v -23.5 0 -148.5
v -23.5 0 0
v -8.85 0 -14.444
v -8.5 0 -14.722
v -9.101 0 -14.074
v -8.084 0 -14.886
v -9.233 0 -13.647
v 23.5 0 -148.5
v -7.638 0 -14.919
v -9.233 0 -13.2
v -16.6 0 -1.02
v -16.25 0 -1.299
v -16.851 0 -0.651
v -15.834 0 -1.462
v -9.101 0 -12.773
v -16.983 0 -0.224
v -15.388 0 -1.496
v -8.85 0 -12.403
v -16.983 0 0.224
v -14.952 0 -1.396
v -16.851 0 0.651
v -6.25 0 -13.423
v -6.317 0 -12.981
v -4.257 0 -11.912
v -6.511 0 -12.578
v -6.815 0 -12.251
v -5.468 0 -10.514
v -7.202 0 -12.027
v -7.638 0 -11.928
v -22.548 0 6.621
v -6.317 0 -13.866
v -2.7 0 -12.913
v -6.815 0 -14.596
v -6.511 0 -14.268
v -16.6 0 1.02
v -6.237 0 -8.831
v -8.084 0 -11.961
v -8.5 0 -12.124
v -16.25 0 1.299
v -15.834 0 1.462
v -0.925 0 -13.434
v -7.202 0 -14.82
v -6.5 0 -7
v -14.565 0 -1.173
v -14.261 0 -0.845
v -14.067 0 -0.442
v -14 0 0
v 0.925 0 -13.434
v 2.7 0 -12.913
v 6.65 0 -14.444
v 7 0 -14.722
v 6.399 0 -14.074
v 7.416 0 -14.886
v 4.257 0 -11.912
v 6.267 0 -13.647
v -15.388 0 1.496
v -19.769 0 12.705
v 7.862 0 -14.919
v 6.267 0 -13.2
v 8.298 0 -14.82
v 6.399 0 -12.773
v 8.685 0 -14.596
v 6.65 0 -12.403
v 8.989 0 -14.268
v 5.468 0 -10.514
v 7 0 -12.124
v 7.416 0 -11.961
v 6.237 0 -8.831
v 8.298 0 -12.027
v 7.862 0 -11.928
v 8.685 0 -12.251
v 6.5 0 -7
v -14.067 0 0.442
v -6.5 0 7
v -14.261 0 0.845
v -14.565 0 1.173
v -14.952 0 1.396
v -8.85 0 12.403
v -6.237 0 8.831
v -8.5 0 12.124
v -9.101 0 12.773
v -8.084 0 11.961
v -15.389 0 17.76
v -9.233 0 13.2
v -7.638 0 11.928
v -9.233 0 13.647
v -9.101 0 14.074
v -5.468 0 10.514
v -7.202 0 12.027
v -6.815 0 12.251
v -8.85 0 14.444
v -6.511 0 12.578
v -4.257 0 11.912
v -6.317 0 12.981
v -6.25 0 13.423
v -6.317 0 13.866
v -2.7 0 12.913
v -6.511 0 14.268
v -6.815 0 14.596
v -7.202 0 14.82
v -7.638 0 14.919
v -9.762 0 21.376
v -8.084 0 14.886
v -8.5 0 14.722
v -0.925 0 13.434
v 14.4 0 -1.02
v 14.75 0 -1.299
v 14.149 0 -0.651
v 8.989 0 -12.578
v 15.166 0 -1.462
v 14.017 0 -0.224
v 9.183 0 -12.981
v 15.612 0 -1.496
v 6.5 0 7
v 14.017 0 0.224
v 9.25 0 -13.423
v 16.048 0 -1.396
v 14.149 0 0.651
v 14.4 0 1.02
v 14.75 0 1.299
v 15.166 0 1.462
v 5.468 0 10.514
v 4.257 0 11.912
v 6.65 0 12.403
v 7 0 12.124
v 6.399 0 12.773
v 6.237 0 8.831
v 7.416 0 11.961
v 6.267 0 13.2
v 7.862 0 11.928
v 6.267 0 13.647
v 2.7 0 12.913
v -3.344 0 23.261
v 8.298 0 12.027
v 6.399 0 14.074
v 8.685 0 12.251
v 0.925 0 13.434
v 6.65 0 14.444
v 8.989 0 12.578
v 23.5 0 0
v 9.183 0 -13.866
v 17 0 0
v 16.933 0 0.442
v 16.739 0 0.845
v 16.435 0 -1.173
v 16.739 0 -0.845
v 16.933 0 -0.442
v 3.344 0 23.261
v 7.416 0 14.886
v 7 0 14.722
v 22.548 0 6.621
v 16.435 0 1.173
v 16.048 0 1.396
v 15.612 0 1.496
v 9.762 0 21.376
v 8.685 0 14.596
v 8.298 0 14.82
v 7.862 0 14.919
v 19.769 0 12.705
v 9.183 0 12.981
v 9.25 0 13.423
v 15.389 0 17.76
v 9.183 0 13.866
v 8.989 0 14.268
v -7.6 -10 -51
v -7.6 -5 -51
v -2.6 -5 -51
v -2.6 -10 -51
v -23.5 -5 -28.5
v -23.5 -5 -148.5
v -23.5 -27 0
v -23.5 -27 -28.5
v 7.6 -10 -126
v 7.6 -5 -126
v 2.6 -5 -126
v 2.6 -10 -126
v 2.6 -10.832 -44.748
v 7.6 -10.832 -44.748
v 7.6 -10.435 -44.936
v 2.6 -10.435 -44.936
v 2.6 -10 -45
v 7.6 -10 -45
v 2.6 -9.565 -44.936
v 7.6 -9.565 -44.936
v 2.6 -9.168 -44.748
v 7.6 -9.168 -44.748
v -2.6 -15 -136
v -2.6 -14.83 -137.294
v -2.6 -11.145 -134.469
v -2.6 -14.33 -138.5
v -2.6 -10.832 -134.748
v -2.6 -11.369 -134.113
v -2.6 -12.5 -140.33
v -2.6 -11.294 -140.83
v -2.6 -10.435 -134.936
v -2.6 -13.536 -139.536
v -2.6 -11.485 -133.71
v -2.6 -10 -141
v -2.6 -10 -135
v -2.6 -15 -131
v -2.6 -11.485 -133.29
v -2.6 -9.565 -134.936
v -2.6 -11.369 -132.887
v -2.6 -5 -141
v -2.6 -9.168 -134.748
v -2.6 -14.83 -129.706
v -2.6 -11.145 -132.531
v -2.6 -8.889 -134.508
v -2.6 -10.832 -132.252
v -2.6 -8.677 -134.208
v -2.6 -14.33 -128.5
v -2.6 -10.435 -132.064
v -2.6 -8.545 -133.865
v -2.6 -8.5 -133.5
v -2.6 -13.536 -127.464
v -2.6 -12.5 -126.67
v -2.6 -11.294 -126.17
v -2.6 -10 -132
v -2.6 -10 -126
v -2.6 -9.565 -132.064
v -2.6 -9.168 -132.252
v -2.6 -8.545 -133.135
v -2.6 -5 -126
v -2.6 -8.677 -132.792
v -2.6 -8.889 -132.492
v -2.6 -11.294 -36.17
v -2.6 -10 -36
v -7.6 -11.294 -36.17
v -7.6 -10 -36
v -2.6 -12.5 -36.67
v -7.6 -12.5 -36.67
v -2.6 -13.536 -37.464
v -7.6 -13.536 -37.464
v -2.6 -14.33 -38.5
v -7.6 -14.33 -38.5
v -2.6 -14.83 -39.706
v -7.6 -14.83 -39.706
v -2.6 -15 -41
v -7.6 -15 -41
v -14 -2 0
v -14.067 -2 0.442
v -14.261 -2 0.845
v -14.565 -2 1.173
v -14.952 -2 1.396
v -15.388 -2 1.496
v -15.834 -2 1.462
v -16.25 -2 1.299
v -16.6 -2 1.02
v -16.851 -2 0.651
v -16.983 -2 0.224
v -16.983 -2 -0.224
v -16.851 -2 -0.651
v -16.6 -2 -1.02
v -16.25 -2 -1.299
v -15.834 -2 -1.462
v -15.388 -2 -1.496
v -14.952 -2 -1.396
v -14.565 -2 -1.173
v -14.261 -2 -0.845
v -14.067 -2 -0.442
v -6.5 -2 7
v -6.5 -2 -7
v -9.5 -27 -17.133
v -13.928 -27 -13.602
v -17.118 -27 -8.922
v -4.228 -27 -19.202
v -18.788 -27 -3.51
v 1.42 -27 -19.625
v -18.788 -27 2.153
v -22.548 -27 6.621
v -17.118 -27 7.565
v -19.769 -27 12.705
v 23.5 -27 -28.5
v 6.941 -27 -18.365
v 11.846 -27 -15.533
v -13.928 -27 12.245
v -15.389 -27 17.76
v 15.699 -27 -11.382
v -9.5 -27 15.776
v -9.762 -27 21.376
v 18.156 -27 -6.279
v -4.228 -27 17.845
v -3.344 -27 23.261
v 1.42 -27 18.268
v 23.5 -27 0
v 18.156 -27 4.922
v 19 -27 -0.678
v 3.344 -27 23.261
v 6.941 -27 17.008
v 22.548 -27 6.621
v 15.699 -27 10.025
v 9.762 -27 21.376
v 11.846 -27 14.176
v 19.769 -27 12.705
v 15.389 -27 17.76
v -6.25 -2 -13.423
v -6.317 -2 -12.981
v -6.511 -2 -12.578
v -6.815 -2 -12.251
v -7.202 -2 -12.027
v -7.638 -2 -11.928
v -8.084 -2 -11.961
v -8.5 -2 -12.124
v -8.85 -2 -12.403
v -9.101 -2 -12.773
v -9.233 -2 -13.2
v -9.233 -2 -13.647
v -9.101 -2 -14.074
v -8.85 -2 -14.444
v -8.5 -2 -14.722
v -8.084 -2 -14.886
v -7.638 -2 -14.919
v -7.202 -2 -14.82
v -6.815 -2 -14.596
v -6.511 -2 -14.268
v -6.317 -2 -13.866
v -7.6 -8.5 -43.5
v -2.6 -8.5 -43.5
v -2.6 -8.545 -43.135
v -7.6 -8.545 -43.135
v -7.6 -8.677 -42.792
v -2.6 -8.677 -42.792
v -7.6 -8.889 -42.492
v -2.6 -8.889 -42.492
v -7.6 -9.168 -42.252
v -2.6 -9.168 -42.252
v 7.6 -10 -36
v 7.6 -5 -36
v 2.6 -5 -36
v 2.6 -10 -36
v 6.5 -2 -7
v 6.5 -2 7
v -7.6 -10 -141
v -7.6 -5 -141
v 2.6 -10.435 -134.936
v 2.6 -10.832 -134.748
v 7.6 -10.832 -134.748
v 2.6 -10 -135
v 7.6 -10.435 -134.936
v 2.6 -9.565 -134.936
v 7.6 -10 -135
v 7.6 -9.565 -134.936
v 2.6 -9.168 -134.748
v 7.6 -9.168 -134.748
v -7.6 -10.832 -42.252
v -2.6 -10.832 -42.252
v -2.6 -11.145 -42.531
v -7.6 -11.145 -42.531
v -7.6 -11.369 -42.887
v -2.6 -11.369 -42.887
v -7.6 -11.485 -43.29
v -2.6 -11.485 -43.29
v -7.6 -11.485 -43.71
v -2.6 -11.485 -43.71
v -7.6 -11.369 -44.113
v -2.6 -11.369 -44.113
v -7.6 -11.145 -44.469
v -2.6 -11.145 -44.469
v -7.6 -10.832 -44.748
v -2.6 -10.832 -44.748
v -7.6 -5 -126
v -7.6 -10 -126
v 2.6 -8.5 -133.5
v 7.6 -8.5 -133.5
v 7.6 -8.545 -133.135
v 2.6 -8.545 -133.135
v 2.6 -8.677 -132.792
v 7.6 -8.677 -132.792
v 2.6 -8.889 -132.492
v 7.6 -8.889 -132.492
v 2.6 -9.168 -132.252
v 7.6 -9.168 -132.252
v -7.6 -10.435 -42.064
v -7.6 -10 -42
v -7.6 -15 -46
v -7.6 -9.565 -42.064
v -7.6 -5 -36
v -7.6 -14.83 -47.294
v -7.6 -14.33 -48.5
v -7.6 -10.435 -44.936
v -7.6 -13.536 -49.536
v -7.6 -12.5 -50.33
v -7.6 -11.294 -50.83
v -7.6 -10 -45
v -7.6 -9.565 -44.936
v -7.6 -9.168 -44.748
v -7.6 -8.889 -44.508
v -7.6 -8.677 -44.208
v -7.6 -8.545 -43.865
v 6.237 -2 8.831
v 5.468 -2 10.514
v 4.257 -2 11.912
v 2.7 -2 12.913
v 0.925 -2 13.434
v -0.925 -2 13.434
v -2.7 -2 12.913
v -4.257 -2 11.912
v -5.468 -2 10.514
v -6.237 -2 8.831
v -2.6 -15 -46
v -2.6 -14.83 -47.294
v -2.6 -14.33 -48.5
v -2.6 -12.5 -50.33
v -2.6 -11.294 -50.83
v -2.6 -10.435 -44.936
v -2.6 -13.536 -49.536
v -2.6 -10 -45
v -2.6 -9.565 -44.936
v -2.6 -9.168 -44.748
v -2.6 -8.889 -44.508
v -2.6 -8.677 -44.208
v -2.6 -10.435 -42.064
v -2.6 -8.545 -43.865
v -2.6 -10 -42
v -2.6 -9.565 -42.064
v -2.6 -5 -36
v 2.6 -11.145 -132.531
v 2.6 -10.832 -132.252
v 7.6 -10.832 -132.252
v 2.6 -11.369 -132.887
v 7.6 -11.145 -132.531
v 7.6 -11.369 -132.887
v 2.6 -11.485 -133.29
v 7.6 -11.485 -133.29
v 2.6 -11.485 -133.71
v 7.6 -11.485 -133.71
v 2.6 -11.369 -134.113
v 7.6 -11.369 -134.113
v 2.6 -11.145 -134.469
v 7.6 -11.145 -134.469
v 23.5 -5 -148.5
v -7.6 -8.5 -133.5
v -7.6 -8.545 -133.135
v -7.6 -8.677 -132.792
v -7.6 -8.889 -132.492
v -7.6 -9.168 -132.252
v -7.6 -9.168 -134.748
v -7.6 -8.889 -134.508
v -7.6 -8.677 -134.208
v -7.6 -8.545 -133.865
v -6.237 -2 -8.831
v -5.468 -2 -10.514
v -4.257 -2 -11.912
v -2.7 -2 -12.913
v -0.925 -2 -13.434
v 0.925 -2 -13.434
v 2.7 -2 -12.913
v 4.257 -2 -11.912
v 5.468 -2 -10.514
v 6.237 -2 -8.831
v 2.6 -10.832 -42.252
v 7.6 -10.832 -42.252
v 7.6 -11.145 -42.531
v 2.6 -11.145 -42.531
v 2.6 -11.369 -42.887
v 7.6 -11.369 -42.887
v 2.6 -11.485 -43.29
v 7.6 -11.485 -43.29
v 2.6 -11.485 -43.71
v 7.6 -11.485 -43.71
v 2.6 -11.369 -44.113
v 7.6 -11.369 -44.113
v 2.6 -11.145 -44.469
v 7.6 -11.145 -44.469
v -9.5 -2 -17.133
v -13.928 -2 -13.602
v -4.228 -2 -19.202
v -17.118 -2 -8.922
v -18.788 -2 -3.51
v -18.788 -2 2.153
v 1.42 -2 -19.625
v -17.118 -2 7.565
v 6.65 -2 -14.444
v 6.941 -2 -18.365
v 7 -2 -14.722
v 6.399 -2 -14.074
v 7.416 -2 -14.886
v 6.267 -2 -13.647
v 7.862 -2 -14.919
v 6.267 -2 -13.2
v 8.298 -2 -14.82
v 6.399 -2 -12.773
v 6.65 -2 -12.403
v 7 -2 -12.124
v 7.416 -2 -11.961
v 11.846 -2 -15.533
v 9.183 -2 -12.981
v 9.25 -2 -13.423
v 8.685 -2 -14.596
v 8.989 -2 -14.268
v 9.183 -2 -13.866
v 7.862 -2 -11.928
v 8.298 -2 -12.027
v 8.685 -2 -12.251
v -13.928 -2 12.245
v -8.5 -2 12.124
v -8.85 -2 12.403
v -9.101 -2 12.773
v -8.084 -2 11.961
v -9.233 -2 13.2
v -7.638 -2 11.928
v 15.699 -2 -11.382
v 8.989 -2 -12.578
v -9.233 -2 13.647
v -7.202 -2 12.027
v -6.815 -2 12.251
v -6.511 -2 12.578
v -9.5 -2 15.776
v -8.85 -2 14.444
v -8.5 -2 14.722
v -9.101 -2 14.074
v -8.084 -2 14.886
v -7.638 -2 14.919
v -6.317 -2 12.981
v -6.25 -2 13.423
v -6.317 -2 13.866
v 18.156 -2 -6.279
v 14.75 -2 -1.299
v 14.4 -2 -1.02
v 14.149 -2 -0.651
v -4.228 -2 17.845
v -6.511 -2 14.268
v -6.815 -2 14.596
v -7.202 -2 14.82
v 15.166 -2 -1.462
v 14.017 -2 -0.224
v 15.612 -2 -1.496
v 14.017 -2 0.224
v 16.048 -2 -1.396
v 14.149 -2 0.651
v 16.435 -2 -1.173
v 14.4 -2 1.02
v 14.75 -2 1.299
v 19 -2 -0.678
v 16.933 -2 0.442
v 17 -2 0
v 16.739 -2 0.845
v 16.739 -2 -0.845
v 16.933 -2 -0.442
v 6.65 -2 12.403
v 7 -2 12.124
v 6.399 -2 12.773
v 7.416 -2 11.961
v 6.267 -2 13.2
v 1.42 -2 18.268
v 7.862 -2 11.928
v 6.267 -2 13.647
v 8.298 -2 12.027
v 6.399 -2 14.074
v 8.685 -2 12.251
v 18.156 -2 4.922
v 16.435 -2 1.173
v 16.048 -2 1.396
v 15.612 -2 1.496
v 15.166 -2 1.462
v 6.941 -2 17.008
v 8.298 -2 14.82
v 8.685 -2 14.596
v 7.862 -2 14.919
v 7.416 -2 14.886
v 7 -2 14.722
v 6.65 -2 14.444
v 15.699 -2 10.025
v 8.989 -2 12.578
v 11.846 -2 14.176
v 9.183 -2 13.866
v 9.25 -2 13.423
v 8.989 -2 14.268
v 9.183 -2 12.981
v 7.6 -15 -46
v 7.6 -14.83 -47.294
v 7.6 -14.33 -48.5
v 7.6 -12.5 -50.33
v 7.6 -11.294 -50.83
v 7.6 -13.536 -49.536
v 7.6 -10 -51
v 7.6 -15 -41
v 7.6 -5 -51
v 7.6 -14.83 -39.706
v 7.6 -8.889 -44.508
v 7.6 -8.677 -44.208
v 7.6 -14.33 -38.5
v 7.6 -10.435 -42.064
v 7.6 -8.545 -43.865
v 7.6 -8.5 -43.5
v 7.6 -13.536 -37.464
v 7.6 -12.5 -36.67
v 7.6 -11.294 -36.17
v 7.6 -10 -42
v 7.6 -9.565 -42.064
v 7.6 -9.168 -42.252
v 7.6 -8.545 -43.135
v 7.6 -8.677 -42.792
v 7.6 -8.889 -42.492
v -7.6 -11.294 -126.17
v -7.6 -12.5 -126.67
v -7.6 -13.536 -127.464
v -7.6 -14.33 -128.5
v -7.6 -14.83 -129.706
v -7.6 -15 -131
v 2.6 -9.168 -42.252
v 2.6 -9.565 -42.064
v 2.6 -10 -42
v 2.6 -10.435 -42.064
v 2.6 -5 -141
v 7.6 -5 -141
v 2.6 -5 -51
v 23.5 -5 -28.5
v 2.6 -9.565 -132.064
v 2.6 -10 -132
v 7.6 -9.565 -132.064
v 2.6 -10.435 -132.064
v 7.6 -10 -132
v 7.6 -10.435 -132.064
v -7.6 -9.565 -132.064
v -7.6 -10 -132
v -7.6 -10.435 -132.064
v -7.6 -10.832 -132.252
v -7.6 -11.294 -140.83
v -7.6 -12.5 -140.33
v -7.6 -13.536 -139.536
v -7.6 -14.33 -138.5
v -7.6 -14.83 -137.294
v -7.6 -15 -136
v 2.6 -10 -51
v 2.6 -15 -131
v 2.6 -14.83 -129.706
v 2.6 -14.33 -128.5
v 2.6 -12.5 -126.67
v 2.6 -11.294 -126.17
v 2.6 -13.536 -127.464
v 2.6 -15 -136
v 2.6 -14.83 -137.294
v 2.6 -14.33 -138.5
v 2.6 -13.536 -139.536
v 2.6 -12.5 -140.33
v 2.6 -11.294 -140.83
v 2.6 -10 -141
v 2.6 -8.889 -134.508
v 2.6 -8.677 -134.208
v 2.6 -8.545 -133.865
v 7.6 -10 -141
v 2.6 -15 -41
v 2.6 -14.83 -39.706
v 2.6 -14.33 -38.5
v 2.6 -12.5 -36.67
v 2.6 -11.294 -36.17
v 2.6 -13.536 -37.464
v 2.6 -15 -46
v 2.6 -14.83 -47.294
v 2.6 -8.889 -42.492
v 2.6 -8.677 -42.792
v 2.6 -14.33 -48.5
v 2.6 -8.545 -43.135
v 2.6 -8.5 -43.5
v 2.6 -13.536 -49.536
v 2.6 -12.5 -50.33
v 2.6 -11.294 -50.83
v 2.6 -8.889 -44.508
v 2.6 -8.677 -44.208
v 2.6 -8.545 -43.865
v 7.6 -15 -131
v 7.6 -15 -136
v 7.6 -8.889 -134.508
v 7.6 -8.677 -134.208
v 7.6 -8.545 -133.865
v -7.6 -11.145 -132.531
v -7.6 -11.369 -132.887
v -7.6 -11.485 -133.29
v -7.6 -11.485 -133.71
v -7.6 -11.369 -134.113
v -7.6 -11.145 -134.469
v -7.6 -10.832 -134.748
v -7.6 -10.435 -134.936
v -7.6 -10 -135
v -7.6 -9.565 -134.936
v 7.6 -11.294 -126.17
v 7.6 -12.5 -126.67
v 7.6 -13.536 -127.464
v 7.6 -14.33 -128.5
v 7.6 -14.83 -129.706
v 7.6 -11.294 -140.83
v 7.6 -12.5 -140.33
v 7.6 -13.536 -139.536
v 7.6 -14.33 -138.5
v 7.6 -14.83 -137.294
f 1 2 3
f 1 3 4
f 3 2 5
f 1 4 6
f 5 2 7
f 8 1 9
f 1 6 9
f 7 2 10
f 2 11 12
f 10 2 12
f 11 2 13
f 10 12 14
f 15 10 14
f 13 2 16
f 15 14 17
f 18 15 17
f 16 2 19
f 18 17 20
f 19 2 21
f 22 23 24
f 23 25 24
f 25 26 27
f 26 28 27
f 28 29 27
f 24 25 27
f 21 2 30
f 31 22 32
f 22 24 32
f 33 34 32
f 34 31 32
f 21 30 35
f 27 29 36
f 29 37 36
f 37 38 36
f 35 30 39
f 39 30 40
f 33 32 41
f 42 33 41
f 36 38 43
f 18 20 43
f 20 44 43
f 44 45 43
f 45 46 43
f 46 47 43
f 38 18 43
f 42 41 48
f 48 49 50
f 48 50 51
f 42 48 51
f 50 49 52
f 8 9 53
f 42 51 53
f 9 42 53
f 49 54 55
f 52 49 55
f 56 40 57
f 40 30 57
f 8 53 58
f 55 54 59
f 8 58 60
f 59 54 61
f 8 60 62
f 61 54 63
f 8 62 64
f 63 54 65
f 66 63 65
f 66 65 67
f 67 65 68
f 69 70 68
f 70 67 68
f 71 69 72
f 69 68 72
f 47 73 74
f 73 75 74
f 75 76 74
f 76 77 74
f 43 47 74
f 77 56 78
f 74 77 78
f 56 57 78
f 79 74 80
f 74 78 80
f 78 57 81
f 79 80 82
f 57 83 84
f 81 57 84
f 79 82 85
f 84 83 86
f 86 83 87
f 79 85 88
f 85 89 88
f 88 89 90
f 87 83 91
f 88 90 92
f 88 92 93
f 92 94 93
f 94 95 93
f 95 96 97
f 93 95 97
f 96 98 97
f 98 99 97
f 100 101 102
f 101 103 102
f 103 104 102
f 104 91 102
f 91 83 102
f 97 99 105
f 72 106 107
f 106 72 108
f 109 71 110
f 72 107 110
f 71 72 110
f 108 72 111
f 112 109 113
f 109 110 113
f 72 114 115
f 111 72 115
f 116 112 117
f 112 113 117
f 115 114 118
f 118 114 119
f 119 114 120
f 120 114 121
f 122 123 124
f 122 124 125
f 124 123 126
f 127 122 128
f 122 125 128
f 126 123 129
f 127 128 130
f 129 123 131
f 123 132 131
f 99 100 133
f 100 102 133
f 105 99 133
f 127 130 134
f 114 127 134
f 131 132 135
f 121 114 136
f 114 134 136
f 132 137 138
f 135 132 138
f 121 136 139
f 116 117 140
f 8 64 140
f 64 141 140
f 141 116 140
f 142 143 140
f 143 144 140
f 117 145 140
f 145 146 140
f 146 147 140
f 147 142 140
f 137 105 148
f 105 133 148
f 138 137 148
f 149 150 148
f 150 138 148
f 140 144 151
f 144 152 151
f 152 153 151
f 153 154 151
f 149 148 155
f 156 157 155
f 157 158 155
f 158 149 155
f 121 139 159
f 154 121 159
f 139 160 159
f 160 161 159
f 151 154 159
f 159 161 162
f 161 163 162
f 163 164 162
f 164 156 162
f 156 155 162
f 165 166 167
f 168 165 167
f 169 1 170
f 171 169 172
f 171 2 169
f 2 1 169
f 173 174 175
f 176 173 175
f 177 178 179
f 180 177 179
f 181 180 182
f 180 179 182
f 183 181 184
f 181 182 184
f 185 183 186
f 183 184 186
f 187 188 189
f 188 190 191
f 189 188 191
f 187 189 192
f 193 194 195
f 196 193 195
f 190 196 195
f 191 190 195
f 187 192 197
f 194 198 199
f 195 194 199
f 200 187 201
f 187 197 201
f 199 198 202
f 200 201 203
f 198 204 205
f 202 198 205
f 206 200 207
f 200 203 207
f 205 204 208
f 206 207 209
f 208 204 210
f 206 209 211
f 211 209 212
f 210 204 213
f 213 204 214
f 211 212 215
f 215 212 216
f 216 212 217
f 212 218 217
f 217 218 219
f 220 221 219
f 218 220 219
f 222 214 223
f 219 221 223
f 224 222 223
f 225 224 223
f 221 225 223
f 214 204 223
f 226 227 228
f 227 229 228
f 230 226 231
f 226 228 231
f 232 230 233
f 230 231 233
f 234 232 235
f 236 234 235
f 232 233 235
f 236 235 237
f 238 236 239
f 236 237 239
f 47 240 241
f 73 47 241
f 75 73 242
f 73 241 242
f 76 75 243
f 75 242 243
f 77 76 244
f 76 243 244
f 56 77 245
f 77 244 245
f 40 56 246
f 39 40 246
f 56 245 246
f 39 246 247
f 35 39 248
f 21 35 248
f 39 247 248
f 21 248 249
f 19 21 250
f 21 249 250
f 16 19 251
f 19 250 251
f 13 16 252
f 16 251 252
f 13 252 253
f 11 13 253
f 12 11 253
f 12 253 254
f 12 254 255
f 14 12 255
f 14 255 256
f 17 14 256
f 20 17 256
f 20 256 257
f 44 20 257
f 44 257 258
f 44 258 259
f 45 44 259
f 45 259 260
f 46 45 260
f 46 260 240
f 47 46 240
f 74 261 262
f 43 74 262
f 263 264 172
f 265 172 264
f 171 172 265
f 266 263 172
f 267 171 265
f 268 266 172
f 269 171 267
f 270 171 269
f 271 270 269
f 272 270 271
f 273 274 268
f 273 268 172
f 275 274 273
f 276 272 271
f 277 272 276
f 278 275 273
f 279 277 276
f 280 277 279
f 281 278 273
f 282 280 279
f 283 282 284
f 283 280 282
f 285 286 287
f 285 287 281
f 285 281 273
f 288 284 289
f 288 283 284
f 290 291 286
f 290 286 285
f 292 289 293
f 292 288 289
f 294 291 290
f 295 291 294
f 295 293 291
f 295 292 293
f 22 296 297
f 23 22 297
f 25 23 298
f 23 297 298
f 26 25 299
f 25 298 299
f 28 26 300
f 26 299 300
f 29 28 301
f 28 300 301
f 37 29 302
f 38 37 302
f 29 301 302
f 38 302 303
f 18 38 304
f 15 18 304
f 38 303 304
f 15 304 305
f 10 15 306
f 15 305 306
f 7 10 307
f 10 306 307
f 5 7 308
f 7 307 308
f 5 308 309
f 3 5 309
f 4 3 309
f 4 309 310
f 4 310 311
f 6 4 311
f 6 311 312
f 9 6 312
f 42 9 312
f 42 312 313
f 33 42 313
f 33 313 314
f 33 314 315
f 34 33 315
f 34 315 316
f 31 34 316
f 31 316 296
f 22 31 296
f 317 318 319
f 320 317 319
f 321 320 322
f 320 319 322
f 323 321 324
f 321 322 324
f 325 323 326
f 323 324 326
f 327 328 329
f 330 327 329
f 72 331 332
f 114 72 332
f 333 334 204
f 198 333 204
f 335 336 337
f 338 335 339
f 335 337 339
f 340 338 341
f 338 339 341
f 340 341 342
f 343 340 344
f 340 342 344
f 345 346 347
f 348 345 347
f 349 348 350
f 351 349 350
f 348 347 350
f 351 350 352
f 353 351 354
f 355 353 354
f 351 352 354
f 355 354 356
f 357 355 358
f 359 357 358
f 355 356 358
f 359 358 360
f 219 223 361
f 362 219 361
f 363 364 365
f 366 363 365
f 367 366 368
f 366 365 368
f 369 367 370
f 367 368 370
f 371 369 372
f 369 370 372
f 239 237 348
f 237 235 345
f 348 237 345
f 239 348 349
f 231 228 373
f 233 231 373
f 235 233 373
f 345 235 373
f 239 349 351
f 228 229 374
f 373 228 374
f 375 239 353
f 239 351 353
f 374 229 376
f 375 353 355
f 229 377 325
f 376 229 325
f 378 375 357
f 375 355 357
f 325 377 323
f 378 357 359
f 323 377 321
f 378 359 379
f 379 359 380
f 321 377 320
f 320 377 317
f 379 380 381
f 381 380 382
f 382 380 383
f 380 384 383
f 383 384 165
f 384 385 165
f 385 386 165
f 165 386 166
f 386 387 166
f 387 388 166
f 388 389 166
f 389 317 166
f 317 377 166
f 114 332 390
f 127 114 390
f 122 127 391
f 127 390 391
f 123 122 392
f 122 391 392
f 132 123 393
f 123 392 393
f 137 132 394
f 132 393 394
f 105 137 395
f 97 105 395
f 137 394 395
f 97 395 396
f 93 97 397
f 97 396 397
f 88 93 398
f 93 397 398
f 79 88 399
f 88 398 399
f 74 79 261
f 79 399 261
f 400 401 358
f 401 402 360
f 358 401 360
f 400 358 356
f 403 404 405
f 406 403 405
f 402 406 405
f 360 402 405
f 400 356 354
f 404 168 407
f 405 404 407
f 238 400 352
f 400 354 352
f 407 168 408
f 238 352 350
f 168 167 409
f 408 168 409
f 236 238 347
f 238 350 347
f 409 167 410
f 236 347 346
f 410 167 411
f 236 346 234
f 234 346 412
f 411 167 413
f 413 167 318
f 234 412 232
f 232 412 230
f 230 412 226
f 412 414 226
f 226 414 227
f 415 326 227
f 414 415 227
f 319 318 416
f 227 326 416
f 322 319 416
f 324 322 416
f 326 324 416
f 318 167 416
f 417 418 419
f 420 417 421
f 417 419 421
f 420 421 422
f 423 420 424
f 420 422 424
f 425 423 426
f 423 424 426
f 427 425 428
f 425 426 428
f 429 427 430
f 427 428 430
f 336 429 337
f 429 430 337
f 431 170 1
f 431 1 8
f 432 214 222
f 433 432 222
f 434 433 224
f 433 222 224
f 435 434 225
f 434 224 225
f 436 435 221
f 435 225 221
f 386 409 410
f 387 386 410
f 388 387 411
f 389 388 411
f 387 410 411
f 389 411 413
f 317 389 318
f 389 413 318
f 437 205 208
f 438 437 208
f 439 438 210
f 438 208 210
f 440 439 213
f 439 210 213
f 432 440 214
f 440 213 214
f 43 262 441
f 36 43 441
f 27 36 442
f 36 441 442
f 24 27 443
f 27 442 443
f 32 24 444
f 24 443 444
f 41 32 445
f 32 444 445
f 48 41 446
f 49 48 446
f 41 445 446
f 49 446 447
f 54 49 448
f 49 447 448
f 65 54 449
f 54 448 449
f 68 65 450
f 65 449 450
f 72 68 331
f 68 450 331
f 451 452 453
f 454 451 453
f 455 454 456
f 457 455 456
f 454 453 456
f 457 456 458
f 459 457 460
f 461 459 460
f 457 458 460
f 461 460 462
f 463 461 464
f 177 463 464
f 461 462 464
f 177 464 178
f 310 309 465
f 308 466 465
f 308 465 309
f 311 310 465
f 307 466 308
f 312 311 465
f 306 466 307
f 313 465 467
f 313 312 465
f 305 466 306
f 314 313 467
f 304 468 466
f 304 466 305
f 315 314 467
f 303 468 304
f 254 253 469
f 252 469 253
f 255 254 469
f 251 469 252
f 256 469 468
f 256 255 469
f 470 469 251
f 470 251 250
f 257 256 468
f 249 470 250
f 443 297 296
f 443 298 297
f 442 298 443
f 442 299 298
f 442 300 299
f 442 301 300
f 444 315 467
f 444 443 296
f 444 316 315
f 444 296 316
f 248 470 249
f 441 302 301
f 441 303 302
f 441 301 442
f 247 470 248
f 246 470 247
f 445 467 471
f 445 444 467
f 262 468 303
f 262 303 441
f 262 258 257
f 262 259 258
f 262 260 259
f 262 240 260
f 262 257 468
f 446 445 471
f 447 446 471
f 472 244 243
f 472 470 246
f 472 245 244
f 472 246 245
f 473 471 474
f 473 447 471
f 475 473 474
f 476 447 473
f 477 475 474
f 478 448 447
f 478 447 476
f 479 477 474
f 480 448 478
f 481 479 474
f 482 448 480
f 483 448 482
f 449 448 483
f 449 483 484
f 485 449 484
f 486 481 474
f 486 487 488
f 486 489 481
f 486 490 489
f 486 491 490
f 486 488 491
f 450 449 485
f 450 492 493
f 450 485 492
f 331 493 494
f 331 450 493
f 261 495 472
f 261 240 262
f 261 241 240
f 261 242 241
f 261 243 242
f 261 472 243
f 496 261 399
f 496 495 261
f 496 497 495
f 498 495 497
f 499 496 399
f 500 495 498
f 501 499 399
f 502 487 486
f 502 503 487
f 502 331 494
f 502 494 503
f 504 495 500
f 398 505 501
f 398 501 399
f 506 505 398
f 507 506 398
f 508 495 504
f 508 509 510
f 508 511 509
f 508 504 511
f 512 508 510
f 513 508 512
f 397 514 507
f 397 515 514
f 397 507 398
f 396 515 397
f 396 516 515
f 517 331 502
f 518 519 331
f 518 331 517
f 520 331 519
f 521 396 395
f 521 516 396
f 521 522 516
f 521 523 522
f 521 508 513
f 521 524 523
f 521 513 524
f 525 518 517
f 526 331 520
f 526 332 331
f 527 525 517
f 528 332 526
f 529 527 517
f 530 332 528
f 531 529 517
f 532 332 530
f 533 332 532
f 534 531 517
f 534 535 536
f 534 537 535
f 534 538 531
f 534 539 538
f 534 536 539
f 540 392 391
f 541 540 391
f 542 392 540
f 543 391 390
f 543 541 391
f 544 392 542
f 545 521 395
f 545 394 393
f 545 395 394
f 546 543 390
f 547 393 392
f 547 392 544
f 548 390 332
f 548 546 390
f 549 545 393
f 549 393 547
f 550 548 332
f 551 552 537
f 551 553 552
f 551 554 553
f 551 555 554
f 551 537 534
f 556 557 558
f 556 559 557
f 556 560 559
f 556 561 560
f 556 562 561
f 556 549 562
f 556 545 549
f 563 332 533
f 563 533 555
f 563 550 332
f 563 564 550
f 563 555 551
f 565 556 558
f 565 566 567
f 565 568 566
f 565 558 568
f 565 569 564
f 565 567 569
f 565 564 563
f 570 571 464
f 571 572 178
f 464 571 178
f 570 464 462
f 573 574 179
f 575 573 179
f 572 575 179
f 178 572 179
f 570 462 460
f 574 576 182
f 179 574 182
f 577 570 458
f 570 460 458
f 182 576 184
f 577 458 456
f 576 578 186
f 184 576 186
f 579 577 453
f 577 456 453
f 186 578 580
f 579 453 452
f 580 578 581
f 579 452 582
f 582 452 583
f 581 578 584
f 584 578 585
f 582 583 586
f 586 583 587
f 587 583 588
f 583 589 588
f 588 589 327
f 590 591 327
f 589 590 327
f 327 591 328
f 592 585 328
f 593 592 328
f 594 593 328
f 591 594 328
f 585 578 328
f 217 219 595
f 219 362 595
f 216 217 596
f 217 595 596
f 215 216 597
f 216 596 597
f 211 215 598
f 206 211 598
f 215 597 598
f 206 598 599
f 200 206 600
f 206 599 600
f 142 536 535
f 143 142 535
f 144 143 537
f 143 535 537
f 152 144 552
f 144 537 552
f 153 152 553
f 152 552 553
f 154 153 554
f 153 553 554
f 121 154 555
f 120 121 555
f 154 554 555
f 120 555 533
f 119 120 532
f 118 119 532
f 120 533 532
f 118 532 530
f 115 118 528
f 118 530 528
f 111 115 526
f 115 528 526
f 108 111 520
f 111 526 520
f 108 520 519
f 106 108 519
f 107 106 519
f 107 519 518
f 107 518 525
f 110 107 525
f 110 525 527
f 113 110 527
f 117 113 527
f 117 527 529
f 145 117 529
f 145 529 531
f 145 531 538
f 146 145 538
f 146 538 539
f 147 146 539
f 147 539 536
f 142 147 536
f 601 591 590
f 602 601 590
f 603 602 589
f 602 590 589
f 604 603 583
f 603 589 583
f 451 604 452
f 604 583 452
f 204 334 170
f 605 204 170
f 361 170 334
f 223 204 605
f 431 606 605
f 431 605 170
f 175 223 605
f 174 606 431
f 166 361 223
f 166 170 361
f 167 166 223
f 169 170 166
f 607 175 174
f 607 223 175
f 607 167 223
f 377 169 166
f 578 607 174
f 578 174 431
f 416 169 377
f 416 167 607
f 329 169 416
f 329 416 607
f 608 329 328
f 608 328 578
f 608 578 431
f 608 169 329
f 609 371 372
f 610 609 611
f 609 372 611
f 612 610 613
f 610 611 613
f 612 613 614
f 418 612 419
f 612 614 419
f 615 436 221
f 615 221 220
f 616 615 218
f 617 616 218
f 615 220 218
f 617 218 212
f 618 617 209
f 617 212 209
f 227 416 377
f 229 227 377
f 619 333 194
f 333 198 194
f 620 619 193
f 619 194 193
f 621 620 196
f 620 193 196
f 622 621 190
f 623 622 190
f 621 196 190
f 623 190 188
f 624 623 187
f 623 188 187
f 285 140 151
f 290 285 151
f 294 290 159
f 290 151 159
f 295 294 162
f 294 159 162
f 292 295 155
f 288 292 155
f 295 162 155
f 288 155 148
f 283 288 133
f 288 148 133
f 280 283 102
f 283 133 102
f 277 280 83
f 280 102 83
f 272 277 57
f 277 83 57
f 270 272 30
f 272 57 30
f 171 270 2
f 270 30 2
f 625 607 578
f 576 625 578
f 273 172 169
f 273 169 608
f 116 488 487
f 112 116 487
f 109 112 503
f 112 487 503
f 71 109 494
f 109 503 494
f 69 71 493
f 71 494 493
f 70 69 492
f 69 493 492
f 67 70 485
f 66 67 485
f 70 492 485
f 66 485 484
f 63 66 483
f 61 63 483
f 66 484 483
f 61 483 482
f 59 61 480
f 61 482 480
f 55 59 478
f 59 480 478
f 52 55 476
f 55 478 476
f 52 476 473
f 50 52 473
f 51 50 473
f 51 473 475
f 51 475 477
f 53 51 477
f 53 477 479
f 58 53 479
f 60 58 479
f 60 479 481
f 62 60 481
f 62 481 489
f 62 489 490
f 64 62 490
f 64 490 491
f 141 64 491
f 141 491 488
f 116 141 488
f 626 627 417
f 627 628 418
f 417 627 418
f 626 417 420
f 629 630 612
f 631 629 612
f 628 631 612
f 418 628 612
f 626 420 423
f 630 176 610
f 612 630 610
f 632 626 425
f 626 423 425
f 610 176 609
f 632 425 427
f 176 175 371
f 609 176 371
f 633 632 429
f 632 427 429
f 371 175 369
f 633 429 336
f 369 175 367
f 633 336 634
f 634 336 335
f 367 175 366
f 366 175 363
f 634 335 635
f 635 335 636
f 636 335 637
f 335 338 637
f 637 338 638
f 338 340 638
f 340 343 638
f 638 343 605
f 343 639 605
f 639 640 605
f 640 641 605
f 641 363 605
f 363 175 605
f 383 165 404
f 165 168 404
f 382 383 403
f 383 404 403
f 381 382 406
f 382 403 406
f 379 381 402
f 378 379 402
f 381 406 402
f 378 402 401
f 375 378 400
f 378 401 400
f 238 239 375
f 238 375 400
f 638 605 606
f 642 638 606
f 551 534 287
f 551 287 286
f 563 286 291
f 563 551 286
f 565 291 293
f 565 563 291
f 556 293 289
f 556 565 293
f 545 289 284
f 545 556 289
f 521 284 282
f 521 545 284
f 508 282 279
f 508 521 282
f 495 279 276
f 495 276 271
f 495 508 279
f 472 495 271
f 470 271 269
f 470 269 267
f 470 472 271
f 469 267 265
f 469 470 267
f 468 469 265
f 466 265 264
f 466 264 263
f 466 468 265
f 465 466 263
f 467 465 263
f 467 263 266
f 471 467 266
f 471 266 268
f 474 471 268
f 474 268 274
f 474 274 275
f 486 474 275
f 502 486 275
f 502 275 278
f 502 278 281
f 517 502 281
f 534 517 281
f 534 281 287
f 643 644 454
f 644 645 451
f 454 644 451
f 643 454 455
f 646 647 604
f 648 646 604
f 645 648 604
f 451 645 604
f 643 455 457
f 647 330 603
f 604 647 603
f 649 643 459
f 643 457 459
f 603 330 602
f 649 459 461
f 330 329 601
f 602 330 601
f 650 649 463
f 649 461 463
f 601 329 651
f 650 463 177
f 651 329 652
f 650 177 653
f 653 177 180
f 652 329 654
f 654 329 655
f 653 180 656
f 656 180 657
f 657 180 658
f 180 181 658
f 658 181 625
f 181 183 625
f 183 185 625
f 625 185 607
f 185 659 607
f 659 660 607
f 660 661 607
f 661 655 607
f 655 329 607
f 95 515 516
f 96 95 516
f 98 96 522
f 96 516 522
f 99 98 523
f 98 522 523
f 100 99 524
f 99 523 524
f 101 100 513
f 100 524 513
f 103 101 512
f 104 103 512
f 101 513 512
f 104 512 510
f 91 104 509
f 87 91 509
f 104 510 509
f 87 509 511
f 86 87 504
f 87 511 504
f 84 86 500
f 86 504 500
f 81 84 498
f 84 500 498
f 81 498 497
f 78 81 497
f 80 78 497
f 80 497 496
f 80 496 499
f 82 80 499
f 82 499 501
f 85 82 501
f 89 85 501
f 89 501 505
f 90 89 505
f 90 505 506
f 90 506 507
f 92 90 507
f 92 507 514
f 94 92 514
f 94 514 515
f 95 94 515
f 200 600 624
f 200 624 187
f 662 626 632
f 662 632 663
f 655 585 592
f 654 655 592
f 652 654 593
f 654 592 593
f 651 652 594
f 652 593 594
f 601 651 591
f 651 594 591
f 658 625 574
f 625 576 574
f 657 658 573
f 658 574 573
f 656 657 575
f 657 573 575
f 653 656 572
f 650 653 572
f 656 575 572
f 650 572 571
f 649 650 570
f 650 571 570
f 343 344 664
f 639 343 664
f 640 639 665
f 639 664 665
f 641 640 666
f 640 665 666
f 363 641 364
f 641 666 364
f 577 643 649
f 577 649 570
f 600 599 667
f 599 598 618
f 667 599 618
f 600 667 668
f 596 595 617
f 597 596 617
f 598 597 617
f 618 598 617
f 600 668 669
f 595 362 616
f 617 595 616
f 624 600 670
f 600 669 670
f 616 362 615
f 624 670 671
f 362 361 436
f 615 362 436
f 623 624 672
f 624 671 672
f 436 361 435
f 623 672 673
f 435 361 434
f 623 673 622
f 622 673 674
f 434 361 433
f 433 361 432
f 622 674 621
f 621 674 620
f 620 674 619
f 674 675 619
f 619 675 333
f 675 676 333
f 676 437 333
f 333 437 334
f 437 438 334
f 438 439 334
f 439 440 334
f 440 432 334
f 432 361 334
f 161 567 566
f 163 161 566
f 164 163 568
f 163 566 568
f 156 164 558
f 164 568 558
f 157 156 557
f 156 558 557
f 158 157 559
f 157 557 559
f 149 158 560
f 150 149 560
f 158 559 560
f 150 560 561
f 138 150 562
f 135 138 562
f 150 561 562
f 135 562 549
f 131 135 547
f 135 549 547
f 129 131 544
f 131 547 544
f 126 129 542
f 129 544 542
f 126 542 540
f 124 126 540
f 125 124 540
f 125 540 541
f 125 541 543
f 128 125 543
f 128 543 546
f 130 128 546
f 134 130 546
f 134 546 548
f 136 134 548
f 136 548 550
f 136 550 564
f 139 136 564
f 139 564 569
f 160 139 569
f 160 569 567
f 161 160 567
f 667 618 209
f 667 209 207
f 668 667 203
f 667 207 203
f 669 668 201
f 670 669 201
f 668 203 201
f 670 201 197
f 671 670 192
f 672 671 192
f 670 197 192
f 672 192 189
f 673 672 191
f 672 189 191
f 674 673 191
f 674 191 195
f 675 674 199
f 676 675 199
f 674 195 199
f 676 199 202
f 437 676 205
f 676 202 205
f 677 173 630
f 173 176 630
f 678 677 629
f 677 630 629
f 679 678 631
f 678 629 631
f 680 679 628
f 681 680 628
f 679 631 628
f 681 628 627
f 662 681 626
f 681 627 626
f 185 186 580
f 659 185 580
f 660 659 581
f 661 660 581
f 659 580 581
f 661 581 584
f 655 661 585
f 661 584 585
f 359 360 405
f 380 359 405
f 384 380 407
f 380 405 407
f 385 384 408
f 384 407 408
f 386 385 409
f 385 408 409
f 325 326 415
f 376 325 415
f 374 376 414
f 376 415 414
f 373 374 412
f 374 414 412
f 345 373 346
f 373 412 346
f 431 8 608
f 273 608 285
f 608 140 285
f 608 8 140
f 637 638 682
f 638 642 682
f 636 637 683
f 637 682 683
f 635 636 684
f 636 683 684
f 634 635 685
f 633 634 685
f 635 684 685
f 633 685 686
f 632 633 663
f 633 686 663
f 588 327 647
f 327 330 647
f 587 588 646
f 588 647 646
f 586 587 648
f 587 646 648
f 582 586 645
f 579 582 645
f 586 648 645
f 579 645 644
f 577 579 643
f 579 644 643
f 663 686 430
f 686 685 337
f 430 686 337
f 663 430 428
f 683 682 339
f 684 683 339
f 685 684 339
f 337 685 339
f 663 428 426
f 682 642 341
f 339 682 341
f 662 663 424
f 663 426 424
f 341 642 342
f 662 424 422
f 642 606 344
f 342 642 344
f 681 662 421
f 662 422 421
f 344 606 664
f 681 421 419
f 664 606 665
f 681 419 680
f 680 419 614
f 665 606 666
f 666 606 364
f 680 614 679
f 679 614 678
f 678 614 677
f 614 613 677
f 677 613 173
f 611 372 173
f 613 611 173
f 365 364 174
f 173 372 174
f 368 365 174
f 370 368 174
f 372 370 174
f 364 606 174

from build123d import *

# Parameters (mm, degrees)
F1_DEPTH  = 2
F2_R      = 1.5
F3_DEPTH  = 5
F4_R      = 19
F5_DEPTH  = 27
F6_W      = 47
F6_H      = 27
F7_DEPTH  = 5
F8_W      = 47
F8_H      = 5
F9_DEPTH  = 120
F11_DEPTH = 10
F13_DEPTH = 25
F15_DEPTH = 25
F16_R     = 5


with BuildPart() as f1:
    # F0 (on Front) → F1 (new body)
    with BuildSketch(Plane.XZ):
        with BuildLine():
            Line((-23.5, -23.5), (0, -23.5))
            Line((0, -23.5), (23.5, -23.5))
            Line((23.5, -23.5), (23.5, 0))
            ThreePointArc((23.5, 0), (0, 23.5), (-23.5, 0))
            Line((-23.5, 0), (-23.5, -23.5))
        make_face()
    extrude(amount=F1_DEPTH)

    # F2 (on face) → F3 (cut)
    with BuildSketch(Plane.XZ.offset(2)):
        with Locations((15.5, 0)):
            Circle(F2_R)
        with Locations((7.75, 13.423394)):
            Circle(F2_R)
        with Locations((-7.75, 13.423394)):
            Circle(F2_R)
        with Locations((-15.5, 0)):
            Circle(F2_R)
        with Locations((-7.75, -13.423394)):
            Circle(F2_R)
        with Locations((7.75, -13.423394)):
            Circle(F2_R)
        with BuildLine():
            Line((6.5, -7), (6.5, 7))
            ThreePointArc((6.5, 7), (0, 13.5), (-6.5, 7))
            Line((-6.5, 7), (-6.5, -7))
            ThreePointArc((-6.5, -7), (0, -13.5), (6.5, -7))
        make_face()
    extrude(amount=-F3_DEPTH, mode=Mode.SUBTRACT)

    # F4 (on Front) → F5 (join)
    with BuildSketch(Plane.XZ):
        with BuildLine():
            ThreePointArc((23.5, 0), (0, 23.5), (-23.5, 0))
            Line((-23.5, 0), (-23.5, -23.5))
            Line((-23.5, -23.5), (23.5, -23.5))
            Line((23.5, -23.5), (23.5, 0))
        make_face()
        with Locations((0, -0.678439)):
            Circle(F4_R, mode=Mode.SUBTRACT)
    extrude(amount=F5_DEPTH)

    # F6 (on face) → F7 (join)
    with BuildSketch(Plane(origin=(0, 0, -23.5), x_dir=(1, 0, 0), z_dir=(0, 0, -1))):
        with Locations((0, 13.5)):
            Rectangle(F6_W, F6_H)
    extrude(amount=F7_DEPTH)

    # F8 (on face) → F9 (join)
    with BuildSketch(Plane(origin=(0, 0, -28.5), x_dir=(1, 0, 0), z_dir=(0, 0, -1))):
        with Locations((0, 2.5)):
            Rectangle(F8_W, F8_H)
    extrude(amount=F9_DEPTH)

    # F10 (on face) → F11 (join)
    with BuildSketch(Plane.XZ.offset(5)):
        Polygon((-2.6, -51), (-2.6, -43.5), (-2.6, -36), (-7.6, -36), (-7.6, -51), align=None)
        Polygon((2.6, -126), (2.6, -133.5), (2.6, -141), (7.6, -141), (7.6, -126), align=None)
        Polygon((2.6, -36), (2.6, -43.5), (2.6, -51), (7.6, -51), (7.6, -36), align=None)
        Polygon((-2.6, -141), (-2.6, -133.5), (-2.6, -126), (-7.6, -126), (-7.6, -141), align=None)
    extrude(amount=F11_DEPTH)

    # F12 (on face) → F13 (cut)
    with BuildSketch(Plane.YZ.offset(7.6)):
        with BuildLine():
            ThreePointArc((-9.16795, -42.251925), (-10, -42), (-10.83205, -42.251925))
            Line((-10.83205, -42.251925), (-10, -43.5))
            Line((-10, -43.5), (-9.16795, -42.251925))
        make_face()
        with BuildLine():
            Line((-10, -43.5), (-10.83205, -42.251925))
            ThreePointArc((-10.83205, -42.251925), (-11.5, -43.5), (-10.83205, -44.748075))
            Line((-10.83205, -44.748075), (-10, -43.5))
        make_face()
        with BuildLine():
            Line((-9.16795, -42.251925), (-10, -43.5))
            Line((-10, -43.5), (-9.16795, -44.748075))
            ThreePointArc((-9.16795, -44.748075), (-8.677488, -44.207787), (-8.5, -43.5))
            ThreePointArc((-8.5, -43.5), (-8.677488, -42.792213), (-9.16795, -42.251925))
        make_face()
        with BuildLine():
            Line((-9.16795, -44.748075), (-10, -43.5))
            Line((-10, -43.5), (-10.83205, -44.748075))
            ThreePointArc((-10.83205, -44.748075), (-10, -45), (-9.16795, -44.748075))
        make_face()
    extrude(amount=-F13_DEPTH, mode=Mode.SUBTRACT)

    # F14 (on face) → F15 (cut)
    with BuildSketch(Plane.YZ.offset(7.6)):
        with BuildLine():
            ThreePointArc((-9.16795, -132.251925), (-10, -132), (-10.83205, -132.251925))
            Line((-10.83205, -132.251925), (-10, -133.5))
            Line((-10, -133.5), (-9.16795, -132.251925))
        make_face()
        with BuildLine():
            Line((-10, -133.5), (-10.83205, -132.251925))
            ThreePointArc((-10.83205, -132.251925), (-11.5, -133.5), (-10.83205, -134.748075))
            Line((-10.83205, -134.748075), (-10, -133.5))
        make_face()
        with BuildLine():
            Line((-9.16795, -132.251925), (-10, -133.5))
            Line((-10, -133.5), (-9.16795, -134.748075))
            ThreePointArc((-9.16795, -134.748075), (-8.677488, -134.207787), (-8.5, -133.5))
            ThreePointArc((-8.5, -133.5), (-8.677488, -132.792213), (-9.16795, -132.251925))
        make_face()
        with BuildLine():
            Line((-9.16795, -134.748075), (-10, -133.5))
            Line((-10, -133.5), (-10.83205, -134.748075))
            ThreePointArc((-10.83205, -134.748075), (-10, -135), (-9.16795, -134.748075))
        make_face()
    extrude(amount=-F15_DEPTH, mode=Mode.SUBTRACT)

    # F16
    f16_edges = [f1.edges().sort_by_distance(p)[0] for p in [
        (5.1, -15, -141),
        (5.1, -15, -126),
        (-5.1, -15, -126),
        (-5.1, -15, -141),
        (5.1, -15, -51),
        (5.1, -15, -36),
        (-5.1, -15, -36),
        (-5.1, -15, -51),
    ]]
    fillet(f16_edges, radius=F16_R)


solid = f1.part
